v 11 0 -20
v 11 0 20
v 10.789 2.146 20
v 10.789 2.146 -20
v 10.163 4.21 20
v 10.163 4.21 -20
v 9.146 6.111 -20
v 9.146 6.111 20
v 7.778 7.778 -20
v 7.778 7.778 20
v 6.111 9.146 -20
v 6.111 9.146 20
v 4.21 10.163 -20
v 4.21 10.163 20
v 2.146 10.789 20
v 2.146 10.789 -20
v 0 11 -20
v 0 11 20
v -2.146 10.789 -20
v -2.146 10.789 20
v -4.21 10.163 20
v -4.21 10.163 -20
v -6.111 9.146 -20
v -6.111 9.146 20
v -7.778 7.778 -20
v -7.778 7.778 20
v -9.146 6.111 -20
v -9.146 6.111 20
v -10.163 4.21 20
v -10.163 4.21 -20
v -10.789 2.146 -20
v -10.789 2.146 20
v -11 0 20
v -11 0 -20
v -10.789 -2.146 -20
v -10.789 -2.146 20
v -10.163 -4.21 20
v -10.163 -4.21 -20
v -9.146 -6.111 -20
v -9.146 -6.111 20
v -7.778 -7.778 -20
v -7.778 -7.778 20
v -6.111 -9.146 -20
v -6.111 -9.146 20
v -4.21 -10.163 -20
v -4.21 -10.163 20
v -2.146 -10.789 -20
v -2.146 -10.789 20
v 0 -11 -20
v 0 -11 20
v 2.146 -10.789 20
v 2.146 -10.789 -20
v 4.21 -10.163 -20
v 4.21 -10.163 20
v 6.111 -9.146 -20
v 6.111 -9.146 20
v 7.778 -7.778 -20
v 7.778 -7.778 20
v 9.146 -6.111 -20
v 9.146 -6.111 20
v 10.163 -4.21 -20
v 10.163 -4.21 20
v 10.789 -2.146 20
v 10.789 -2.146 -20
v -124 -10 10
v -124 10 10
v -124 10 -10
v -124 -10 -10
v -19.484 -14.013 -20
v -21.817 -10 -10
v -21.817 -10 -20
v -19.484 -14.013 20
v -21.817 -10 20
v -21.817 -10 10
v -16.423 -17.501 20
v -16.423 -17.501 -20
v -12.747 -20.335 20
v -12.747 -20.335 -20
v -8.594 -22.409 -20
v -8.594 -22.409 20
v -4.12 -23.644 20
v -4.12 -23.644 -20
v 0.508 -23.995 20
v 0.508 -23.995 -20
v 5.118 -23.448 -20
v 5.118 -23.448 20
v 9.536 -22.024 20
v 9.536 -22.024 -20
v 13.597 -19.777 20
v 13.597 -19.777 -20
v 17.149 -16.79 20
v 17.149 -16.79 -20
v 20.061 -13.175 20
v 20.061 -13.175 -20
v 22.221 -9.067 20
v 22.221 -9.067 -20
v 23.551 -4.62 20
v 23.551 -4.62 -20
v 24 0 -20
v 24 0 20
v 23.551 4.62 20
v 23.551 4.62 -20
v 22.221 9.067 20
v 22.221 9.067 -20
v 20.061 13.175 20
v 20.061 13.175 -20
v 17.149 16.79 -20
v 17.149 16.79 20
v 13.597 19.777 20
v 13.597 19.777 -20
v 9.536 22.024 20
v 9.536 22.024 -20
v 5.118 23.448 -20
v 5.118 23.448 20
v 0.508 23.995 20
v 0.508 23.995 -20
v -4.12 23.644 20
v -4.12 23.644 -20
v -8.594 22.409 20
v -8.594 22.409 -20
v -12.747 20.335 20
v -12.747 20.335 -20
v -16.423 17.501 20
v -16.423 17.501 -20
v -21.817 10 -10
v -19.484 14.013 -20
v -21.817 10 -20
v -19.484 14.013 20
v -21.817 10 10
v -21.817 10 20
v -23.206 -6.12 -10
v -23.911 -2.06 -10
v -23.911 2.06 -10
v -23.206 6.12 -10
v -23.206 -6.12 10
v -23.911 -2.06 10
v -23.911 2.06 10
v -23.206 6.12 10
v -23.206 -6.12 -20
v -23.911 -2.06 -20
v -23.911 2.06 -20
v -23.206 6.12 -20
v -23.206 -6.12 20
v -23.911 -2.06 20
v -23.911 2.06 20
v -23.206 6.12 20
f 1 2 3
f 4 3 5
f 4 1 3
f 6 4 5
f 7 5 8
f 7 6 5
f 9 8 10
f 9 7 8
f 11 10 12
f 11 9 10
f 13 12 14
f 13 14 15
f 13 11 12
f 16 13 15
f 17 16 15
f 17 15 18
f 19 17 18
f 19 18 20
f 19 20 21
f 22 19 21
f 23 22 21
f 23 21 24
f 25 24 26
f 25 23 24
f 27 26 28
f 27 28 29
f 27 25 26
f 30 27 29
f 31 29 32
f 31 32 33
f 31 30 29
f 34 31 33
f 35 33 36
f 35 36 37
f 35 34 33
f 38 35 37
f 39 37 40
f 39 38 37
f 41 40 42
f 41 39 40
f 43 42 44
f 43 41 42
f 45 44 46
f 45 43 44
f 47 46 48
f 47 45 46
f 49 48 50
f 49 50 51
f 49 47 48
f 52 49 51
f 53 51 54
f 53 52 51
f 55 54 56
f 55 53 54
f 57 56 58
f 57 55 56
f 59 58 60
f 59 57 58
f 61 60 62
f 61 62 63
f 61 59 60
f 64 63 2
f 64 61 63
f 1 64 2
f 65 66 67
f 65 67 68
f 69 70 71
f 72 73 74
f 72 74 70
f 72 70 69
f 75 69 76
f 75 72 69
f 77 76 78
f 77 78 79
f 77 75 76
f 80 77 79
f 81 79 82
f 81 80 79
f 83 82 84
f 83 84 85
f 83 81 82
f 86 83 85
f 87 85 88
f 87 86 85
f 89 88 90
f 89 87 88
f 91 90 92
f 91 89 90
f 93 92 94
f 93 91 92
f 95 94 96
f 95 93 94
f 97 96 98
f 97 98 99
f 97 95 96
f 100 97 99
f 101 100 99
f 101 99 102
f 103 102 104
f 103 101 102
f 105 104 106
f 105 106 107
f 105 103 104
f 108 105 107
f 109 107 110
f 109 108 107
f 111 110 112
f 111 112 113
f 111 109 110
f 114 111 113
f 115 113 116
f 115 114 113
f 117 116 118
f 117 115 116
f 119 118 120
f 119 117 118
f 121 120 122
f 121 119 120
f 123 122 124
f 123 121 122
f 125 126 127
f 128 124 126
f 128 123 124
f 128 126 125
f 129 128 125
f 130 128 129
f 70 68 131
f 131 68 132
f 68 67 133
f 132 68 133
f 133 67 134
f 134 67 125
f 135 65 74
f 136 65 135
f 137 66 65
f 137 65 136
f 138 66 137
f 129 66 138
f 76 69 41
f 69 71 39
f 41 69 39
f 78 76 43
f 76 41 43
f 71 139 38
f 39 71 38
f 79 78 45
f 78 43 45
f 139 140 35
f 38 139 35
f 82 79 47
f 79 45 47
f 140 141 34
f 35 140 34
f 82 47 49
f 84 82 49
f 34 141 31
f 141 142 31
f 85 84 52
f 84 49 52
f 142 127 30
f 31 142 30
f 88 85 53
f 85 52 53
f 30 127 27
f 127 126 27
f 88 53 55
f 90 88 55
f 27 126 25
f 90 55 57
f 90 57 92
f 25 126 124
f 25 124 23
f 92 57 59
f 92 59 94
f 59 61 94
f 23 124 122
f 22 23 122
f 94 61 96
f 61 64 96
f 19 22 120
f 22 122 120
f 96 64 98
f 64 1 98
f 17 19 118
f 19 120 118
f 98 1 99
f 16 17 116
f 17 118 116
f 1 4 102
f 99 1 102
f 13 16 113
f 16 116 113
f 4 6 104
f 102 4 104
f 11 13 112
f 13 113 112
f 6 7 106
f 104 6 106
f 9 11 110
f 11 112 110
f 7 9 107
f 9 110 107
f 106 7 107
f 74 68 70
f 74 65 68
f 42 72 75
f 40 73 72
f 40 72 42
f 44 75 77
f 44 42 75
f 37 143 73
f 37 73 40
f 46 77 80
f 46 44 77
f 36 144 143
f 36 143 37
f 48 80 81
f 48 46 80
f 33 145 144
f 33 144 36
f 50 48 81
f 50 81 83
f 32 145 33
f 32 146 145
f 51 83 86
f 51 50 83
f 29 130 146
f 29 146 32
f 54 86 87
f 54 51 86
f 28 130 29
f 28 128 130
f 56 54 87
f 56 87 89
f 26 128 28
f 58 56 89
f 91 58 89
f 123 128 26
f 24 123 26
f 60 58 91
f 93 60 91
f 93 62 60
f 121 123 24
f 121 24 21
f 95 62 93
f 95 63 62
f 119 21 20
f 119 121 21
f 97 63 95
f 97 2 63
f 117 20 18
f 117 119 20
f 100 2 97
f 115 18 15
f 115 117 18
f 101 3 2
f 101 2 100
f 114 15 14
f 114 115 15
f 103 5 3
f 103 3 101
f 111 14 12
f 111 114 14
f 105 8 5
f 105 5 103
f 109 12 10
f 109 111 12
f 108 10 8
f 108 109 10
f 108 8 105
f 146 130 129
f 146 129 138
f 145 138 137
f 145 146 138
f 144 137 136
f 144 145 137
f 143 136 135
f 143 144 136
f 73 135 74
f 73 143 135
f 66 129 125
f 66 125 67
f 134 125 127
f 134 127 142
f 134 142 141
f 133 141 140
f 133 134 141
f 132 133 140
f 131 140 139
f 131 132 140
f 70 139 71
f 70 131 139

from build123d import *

# Parameters (mm, degrees)
F0_R     = 11
F1_DEPTH = 20
F2_DEPTH = 10
F3_DEPTH = 25


with BuildPart() as f1:
    # F0 (on Top) → F1 (new body, symmetric)
    with BuildSketch(Plane.XY):
        with BuildLine():
            ThreePointArc((-21.817424, -10), (5.117705, -23.448008), (24, 0))
            ThreePointArc((24, 0), (5.117705, 23.448008), (-21.817424, 10))
            ThreePointArc((-21.817424, 10), (-24, 0), (-21.817424, -10))
        make_face()
        Circle(F0_R, mode=Mode.SUBTRACT)
    extrude(amount=F1_DEPTH, both=True)

    # F0 (on Top) → F2 (join, symmetric)
    with BuildSketch(Plane.XY):
        with BuildLine():
            ThreePointArc((-21.817424, -10), (-24, 0), (-21.817424, 10))
            Line((-21.817424, 10), (-124, 10))
            Line((-124, 10), (-124, 0))
            Line((-124, 0), (-124, -10))
            Line((-124, -10), (-21.817424, -10))
        make_face()
    extrude(amount=F2_DEPTH, both=True)

    # F0 (on Top) → F3 (cut)
    with BuildSketch(Plane.XY):
        Circle(F0_R)
    extrude(amount=F3_DEPTH, mode=Mode.SUBTRACT)


solid = f1.part
